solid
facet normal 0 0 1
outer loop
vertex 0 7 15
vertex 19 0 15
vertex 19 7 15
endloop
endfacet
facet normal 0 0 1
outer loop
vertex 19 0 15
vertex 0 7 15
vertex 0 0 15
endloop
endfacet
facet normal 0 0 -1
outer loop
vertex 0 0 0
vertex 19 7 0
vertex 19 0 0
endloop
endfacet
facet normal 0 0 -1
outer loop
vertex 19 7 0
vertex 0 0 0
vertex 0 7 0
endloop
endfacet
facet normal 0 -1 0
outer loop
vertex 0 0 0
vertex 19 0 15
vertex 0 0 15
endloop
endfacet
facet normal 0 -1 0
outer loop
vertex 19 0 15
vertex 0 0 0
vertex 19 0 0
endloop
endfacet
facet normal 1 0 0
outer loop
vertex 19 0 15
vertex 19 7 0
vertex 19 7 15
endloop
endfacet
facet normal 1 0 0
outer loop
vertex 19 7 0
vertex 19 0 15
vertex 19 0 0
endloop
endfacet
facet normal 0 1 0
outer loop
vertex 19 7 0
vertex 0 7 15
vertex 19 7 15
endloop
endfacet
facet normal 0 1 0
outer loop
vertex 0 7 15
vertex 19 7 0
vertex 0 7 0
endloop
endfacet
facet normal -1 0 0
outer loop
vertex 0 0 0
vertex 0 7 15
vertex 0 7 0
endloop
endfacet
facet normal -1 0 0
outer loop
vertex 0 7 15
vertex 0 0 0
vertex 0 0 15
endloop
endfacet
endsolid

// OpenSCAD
// Generated by SolidPython 1.0.1 on 2020-07-29 00:46:56


cube(size = [19, 7, 15]);
/***********************************************
*********      SolidPython code:      **********
************************************************
 
# import packages: SolidPython
from solid import *
from solid.utils import *
from itertools import chain, combinations, permutations


class Resize:

    def __init__(self, scad_file):
        self.scad_file = scad_file
        #self.scad_file = import_scad(scad_file)
        # cone/cylinder param:
        self.r1 = 0
        self.r2 = 0
        self.h = 0
        # rectangular prism param:
        self.w = 0
        self.l = 0
        # ellipse param:
        self.r = 0

    # import OpenScad code (file name corresponds to shape)


    # classify shape + parameters
    def assign(self, param1, param2, param3):
        if self.scad_file == 'cone.scad':
            self.r1 = param1
            self.r2 = param2
            self.h = param3
        elif self.scad_file == 'cylinder.scad':
            self.r1 = param1
            self.r2 = param2
            self.h = param3
        elif self.scad_file == 'rectangularPrism.scad':
            self.h = param1
            self.l = param2
            self.w = param3
        else:
            self.r = param1
            self.h = param2

    # resize parameters
    def iterate(self):
        x = range(3, 20, 2)
        i = 1
        if self.scad_file == 'cone.scad':
            tempList = list(permutations(x, 2))
            for temp in tempList:
                param1 = temp[0]
                param2 = temp[1]
                filepath = 'produced_scad_files/' + 'cone' + str(param1) + '_' + str(param2) + '_' + '.scad'
                scad_render_to_file(cylinder(h=param1, r1=param2, r2=0), filepath)

        elif self.scad_file == 'cylinder.scad':
            tempList = list(permutations(x, 3))
            for temp in tempList:
                param1 = temp[0]
                param2 = temp[1]
                filepath = 'produced_scad_files/' + 'cylinder' + str(param1) + '_' + str(param2) + '_' + '.scad'
                scad_render_to_file(cylinder(h=param1, r1=param2, r2=param2), filepath)

        elif self.scad_file == 'rectangularPrism.scad':
            tempList = list(permutations(x, 3))
            for temp in tempList:
                param1 = temp[0]
                param2 = temp[1]
                param3 = temp[2]
                filepath = 'produced_scad_files/' + 'rectangularPrism' + str(param1) + '_' + str(param2) + '_' + str(
                    param3) + '.scad'
                scad_render_to_file(cube(size=(param1, param2, param3)), filepath)

        elif self.scad_file == 'ellipse.scad':
            tempList = list(permutations(x, 4))
            for temp in tempList:
                param1 = temp[0]
                param2 = temp[1]
                param3 = temp[2]
                param4 = temp[3]
                filepath = 'produced_scad_files/' + 'ellipse' + str(param1) + '_' + str(param2) + '_' + str(param3) + '_' + str(param4) + '.scad'
                scad_render_to_file(scale([param1, param2, param3])(sphere(r=param4)), filepath)

    def render_to_scadfile(self):
        scad_render_to_file(scad, 'example.scad') 
 
************************************************/
